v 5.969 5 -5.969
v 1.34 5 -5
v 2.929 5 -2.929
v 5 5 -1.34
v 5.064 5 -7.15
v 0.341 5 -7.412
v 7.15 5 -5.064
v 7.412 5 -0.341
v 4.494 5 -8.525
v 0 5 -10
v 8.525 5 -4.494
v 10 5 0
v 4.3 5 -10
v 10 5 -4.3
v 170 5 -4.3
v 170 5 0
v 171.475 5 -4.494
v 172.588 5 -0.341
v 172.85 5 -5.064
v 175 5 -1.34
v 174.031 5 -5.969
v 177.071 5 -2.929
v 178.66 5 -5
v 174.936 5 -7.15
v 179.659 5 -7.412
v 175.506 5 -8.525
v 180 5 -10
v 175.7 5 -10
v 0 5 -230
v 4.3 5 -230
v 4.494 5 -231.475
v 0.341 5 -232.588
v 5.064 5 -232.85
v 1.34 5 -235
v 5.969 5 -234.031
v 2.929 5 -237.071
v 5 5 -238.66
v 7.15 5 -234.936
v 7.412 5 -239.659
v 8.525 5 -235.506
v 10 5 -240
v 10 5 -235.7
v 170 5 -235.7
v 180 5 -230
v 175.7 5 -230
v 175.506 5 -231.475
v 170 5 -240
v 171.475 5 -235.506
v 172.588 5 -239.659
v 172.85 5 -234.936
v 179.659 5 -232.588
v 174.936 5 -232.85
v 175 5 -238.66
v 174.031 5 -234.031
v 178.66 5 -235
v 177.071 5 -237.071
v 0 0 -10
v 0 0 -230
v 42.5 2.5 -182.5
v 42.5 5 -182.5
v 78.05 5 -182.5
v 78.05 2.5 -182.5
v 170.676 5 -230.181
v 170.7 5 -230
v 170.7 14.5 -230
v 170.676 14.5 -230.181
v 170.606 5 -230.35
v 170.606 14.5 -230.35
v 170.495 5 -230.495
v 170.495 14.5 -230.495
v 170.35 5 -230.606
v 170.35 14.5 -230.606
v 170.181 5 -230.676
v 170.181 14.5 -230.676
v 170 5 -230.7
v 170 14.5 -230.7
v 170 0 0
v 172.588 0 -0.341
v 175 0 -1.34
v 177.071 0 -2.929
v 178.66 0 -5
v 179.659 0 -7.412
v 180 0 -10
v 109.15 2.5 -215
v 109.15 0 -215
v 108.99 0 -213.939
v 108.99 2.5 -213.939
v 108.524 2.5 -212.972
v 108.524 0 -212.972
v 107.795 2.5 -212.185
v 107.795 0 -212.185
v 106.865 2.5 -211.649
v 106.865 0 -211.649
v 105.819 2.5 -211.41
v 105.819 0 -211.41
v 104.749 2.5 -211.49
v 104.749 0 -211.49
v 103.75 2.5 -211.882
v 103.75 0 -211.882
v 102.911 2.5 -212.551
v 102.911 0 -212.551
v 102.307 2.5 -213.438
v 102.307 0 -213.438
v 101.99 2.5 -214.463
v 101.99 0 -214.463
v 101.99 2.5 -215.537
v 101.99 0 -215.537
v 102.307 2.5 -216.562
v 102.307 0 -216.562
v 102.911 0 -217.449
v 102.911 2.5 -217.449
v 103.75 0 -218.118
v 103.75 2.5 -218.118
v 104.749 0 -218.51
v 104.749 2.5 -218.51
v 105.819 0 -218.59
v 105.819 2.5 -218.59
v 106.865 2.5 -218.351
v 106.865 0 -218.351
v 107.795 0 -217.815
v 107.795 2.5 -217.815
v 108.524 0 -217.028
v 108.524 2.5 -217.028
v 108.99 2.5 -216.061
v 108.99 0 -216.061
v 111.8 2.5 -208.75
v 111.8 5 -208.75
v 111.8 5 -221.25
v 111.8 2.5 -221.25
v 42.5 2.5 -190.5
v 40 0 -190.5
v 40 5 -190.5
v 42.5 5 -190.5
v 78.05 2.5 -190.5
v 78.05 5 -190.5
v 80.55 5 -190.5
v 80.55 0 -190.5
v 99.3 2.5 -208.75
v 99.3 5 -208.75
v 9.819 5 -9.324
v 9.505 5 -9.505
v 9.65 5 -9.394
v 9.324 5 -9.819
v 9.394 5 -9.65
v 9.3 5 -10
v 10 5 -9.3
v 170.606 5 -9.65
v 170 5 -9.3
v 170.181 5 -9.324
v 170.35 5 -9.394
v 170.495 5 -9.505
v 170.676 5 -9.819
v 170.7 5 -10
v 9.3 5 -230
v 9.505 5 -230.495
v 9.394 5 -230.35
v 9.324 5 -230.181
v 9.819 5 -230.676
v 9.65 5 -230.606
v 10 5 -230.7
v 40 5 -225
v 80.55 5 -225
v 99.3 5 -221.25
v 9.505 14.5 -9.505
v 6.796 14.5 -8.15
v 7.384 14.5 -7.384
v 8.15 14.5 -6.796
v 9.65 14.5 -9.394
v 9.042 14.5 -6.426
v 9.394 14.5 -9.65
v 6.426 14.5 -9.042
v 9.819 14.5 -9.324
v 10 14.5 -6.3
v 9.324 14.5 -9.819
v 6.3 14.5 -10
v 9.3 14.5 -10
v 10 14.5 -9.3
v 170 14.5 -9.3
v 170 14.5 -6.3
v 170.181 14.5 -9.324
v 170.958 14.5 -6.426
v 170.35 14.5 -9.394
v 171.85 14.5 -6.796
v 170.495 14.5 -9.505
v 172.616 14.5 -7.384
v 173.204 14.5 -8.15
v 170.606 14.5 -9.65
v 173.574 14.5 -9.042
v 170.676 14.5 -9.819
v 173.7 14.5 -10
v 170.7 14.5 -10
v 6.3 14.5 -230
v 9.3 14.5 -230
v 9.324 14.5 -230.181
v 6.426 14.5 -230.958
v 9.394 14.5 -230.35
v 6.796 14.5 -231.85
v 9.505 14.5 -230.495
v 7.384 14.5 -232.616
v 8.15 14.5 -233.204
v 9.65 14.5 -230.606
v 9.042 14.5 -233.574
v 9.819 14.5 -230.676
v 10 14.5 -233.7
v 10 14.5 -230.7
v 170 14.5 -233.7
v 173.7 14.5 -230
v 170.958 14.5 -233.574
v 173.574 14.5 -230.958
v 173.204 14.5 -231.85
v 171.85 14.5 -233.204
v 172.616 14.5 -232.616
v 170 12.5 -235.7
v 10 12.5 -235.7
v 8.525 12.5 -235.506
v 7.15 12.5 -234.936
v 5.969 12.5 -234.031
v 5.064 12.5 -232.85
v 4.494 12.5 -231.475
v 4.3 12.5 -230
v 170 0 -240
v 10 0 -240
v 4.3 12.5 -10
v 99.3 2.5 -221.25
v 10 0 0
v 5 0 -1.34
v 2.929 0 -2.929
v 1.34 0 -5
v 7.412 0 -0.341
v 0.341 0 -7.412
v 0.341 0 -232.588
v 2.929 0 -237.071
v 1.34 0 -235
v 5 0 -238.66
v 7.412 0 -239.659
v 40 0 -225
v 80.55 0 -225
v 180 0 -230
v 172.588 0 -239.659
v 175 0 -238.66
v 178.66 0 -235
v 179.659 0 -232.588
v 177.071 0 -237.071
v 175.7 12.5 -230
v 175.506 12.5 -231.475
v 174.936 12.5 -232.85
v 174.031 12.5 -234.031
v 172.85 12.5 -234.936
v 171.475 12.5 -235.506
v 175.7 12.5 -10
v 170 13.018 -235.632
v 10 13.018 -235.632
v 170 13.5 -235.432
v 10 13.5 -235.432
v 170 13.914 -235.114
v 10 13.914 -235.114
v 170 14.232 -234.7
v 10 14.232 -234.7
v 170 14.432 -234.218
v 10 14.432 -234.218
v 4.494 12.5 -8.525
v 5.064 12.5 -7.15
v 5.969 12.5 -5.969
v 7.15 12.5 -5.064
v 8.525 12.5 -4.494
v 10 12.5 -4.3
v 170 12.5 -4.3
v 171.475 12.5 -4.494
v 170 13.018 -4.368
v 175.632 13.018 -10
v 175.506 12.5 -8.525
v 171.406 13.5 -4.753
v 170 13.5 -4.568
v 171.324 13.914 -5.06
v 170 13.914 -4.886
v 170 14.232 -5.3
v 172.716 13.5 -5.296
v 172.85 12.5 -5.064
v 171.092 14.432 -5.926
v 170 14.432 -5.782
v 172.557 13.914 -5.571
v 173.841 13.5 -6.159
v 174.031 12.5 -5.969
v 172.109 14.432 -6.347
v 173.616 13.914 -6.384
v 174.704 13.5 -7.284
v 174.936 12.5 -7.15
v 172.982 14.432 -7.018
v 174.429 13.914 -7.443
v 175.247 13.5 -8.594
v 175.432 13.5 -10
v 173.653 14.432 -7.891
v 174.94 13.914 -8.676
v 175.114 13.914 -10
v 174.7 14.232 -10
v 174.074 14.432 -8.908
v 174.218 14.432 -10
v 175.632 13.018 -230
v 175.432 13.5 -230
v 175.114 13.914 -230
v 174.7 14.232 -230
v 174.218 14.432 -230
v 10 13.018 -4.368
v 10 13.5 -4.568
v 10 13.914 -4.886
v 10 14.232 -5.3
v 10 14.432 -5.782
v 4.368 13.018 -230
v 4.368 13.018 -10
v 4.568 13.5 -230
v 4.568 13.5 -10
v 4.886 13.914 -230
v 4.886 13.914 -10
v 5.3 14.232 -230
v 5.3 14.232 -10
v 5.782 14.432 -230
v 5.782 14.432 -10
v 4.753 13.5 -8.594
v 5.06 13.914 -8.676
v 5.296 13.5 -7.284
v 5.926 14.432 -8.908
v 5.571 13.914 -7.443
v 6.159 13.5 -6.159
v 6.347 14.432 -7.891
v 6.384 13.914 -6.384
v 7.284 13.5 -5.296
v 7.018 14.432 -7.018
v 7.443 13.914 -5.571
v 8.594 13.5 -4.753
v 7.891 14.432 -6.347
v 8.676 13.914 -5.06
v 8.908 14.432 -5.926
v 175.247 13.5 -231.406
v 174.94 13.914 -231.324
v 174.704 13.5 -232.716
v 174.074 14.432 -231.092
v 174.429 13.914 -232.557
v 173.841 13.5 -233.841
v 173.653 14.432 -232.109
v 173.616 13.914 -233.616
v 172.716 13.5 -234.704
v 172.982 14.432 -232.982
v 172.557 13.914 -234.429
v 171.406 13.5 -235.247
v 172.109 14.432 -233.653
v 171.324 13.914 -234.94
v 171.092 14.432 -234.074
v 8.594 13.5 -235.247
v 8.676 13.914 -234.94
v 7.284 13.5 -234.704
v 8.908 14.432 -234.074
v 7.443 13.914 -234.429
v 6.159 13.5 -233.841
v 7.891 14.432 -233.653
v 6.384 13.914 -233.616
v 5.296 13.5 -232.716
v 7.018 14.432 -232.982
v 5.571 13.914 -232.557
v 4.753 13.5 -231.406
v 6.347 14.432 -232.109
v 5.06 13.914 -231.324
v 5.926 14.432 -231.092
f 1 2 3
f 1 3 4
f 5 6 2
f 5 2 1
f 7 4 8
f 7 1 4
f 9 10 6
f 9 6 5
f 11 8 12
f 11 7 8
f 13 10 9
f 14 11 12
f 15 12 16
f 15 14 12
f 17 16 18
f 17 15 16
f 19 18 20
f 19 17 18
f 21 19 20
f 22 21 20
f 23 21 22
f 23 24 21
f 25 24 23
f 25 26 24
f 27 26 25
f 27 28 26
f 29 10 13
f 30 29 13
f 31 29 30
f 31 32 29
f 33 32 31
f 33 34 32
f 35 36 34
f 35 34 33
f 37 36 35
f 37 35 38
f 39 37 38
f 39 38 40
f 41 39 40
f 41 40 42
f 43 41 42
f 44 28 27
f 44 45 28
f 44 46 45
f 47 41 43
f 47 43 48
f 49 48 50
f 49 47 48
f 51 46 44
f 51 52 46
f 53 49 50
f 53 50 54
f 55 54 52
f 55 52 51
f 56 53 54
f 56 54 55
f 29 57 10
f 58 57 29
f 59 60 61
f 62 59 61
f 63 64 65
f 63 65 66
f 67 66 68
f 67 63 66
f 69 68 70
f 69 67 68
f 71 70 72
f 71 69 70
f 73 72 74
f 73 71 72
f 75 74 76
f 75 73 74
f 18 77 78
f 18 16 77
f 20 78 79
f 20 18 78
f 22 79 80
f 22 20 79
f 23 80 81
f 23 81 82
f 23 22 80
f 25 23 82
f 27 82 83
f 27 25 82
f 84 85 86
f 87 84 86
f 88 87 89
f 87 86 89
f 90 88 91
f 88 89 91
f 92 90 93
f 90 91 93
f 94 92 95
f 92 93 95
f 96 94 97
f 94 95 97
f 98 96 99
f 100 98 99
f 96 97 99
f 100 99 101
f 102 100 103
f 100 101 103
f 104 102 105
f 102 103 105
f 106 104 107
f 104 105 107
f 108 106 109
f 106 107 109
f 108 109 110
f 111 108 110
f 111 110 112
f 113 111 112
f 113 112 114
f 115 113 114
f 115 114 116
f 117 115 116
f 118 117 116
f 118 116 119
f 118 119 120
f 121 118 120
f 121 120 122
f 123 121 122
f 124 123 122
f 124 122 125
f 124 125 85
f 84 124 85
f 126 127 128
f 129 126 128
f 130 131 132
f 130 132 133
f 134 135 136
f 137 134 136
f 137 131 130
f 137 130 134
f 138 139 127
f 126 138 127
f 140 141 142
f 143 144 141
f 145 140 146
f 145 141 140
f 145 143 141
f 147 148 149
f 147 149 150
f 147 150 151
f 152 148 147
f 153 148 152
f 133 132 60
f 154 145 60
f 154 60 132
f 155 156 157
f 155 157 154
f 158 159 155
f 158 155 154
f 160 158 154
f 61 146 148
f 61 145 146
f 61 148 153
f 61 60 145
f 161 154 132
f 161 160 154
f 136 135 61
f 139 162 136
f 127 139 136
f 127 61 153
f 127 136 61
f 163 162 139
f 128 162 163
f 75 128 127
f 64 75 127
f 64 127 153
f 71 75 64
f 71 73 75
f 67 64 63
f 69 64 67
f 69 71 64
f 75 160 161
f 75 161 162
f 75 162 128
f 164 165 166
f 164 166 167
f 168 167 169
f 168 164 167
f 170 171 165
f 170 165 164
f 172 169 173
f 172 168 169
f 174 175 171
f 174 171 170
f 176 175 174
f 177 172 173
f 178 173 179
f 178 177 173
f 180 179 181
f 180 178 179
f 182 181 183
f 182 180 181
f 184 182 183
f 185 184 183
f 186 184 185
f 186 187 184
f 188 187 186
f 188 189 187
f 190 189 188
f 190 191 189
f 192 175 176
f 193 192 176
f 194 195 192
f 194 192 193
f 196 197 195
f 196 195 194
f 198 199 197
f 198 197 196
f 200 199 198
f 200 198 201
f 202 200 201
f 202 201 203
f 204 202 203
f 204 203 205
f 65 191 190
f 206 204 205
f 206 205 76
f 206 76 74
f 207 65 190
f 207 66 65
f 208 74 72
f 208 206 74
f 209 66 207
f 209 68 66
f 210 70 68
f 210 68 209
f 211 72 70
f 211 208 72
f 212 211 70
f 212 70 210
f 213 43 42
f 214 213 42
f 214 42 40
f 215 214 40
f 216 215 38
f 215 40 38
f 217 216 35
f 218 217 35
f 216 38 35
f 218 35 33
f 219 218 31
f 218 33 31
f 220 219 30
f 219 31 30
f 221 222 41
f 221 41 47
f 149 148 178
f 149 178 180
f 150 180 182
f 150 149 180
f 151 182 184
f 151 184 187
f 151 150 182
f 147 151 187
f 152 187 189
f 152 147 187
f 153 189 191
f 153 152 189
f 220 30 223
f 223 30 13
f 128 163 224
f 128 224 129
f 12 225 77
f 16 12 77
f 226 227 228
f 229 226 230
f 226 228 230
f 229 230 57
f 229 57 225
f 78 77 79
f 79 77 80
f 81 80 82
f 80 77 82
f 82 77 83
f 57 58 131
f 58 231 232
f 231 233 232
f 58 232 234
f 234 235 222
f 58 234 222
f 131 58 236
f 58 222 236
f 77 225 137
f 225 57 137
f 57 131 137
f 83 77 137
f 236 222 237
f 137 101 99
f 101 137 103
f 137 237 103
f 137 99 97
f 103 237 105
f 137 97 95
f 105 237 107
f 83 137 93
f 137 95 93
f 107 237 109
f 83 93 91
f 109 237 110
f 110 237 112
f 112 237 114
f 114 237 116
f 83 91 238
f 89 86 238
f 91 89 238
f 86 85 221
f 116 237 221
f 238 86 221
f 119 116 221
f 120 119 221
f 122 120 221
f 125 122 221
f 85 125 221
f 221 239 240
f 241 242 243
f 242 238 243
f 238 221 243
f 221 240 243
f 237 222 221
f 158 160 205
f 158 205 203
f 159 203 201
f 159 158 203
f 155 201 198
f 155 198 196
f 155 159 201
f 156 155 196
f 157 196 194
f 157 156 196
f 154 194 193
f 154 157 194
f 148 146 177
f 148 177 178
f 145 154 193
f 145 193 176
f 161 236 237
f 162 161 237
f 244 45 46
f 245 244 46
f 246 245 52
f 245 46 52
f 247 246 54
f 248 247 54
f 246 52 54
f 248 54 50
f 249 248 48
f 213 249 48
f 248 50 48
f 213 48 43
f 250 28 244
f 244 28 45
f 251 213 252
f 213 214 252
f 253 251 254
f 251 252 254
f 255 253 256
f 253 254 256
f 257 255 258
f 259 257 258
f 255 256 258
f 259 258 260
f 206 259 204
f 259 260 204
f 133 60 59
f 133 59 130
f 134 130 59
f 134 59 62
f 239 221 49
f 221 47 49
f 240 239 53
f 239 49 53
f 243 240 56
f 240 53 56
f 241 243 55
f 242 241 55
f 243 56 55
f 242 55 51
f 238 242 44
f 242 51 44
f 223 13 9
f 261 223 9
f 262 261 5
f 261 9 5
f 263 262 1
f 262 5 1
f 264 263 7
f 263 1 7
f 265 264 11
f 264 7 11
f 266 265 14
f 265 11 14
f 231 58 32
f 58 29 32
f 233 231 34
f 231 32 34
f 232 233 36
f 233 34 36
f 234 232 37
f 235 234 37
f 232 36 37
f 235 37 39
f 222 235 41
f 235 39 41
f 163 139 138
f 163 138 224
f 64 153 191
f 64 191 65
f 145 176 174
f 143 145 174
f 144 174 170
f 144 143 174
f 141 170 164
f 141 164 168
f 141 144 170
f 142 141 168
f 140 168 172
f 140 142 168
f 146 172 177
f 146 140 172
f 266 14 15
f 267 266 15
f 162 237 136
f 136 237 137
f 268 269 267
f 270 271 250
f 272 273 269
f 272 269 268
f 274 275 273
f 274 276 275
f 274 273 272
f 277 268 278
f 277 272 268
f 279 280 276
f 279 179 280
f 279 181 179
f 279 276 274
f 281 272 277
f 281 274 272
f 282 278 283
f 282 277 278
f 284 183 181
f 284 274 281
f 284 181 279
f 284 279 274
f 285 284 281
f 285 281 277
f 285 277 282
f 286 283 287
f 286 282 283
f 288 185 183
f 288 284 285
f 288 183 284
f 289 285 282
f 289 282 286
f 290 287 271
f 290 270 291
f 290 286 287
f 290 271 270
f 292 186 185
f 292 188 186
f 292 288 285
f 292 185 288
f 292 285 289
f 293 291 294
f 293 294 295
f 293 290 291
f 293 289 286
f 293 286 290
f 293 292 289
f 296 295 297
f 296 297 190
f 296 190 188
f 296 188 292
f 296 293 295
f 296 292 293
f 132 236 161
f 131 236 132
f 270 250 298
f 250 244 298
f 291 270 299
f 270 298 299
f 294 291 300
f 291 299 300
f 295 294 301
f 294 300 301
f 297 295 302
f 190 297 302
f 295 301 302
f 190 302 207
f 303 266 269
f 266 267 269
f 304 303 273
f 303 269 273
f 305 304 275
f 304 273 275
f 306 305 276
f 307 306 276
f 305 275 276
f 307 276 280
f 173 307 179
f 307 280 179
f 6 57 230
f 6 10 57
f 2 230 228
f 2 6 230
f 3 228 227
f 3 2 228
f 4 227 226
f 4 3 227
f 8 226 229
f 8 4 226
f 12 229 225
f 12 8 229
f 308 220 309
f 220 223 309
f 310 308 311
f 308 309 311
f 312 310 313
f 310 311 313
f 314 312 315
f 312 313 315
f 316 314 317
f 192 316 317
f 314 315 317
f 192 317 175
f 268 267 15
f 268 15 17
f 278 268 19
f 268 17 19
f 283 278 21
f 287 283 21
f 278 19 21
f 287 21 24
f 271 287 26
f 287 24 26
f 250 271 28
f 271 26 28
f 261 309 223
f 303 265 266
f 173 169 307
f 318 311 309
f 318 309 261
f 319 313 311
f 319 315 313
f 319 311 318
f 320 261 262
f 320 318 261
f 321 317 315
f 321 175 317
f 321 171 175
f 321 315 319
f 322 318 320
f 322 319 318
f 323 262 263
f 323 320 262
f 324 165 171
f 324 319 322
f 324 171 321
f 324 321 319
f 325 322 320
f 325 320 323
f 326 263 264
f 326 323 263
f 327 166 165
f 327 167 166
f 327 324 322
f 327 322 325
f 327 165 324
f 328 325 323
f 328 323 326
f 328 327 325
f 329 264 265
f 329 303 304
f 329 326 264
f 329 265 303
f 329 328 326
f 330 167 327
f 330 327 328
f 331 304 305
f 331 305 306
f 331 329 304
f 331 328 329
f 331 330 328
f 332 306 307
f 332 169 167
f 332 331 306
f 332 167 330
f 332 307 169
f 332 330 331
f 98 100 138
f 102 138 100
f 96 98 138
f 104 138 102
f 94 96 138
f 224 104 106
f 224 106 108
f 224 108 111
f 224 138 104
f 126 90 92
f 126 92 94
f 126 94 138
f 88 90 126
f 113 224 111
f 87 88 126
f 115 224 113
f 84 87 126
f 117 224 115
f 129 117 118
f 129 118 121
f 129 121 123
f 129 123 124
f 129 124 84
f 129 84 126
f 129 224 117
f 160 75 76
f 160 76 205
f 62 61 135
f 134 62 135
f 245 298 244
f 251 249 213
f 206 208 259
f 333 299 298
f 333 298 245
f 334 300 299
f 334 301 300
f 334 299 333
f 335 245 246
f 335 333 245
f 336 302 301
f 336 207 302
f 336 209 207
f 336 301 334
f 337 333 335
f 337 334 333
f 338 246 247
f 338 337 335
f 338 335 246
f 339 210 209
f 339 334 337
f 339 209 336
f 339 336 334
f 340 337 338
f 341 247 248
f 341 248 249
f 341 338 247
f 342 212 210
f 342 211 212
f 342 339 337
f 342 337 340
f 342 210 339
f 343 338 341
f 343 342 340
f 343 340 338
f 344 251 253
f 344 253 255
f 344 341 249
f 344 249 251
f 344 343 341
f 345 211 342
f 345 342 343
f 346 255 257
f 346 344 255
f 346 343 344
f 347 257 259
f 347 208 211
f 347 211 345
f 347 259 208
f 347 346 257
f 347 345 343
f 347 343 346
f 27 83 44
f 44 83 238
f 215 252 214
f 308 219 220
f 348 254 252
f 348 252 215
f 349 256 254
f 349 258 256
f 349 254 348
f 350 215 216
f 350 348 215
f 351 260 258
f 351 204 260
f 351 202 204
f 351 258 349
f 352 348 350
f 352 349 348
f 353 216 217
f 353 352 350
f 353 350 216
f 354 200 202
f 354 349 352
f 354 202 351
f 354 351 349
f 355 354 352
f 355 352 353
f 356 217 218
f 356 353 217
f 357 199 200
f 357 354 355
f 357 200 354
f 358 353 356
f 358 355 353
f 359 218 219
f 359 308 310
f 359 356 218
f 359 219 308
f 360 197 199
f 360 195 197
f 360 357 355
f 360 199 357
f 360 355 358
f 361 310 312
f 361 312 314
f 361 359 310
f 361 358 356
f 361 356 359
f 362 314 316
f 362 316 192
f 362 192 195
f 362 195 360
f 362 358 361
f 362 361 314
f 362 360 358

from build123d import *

# Parameters (mm, degrees)
SKETCH1_W           = 180
SKETCH1_H           = 240
BOSS_EXTRUDE1_DEPTH = 5
SKETCH2_R           = 3.6
SKETCH2_W           = 40.55
SKETCH2_H           = 34.5
CUT_EXTRUDE1_DEPTH  = 6
SKETCH3_W           = 12.5
SKETCH3_H           = 12.5
CUT_EXTRUDE2_DEPTH  = 2.5
SKETCH4_W           = 35.55
SKETCH4_H           = 8
CUT_EXTRUDE3_DEPTH  = 2.5
FILLET1_R           = 10
BOSS_EXTRUDE2_DEPTH = 9.5
FILLET2_R           = 2


with BuildPart() as part:
    # Sketch1 → Boss-Extrude1 (new body)
    with BuildSketch(Plane(origin=(0, 0, 0), x_dir=(1, 0, 0), z_dir=(0, 1, 0))):
        with Locations((90, 120)):
            Rectangle(SKETCH1_W, SKETCH1_H)
    extrude(amount=BOSS_EXTRUDE1_DEPTH)

    # Sketch2 → Cut-Extrude1 (cut, through all)
    with BuildSketch(Plane.XZ):
        with Locations((105.55, -215)):
            Circle(SKETCH2_R)
        with Locations((60.275, -207.75)):
            Rectangle(SKETCH2_W, SKETCH2_H)
    extrude(amount=-CUT_EXTRUDE1_DEPTH, mode=Mode.SUBTRACT)

    # Sketch3 → Cut-Extrude2 (cut)
    with BuildSketch(Plane(origin=(0, 5, 0), x_dir=(1, 0, 0), z_dir=(0, 1, 0))):
        with Locations((105.55, 215)):
            Rectangle(SKETCH3_W, SKETCH3_H)
    extrude(amount=-CUT_EXTRUDE2_DEPTH, mode=Mode.SUBTRACT)

    # Sketch4 → Cut-Extrude3 (cut)
    with BuildSketch(Plane(origin=(0, 5, 0), x_dir=(1, 0, 0), z_dir=(0, 1, 0))):
        with Locations((60.275, 186.5)):
            Rectangle(SKETCH4_W, SKETCH4_H)
    extrude(amount=-CUT_EXTRUDE3_DEPTH, mode=Mode.SUBTRACT)

    # Fillet1
    fillet1_edges = [part.edges().sort_by_distance(p)[0] for p in [
        (0, 2.5, -240),
        (180, 2.5, -240),
        (180, 2.5, 0),
        (0, 2.5, 0),
    ]]
    fillet(fillet1_edges, radius=FILLET1_R)

    # Sketch6 → Boss-Extrude2 (add)
    with BuildSketch(Plane(origin=(0, 5, 0), x_dir=(1, 0, 0), z_dir=(0, 1, 0))):
        with BuildLine():
            Line((175.7, 10), (175.7, 230))
            ThreePointArc((175.7, 230), (174.030508653, 234.030508653), (170, 235.7))
            Line((170, 235.7), (10, 235.7))
            ThreePointArc((10, 235.7), (5.969491347, 234.030508653), (4.3, 230))
            Line((4.3, 230), (4.3, 10))
            ThreePointArc((4.3, 10), (5.969491347, 5.969491347), (10, 4.3))
            Line((10, 4.3), (170, 4.3))
            ThreePointArc((170, 4.3), (174.030508653, 5.969491347), (175.7, 10))
        make_face()
        with BuildLine():
            Line((170.7, 10), (170.7, 230))
            ThreePointArc((170.7, 230), (170.494974747, 230.494974747), (170, 230.7))
            Line((170, 230.7), (10, 230.7))
            ThreePointArc((10, 230.7), (9.505025253, 230.494974747), (9.3, 230))
            Line((9.3, 230), (9.3, 10))
            ThreePointArc((9.3, 10), (9.505025253, 9.505025253), (10, 9.3))
            Line((10, 9.3), (170, 9.3))
            ThreePointArc((170, 9.3), (170.494974747, 9.505025253), (170.7, 10))
        make_face(mode=Mode.SUBTRACT)
    extrude(amount=BOSS_EXTRUDE2_DEPTH)

    # Fillet2
    fillet2_edges = [part.edges().sort_by_distance(p)[0] for p in [
        (174.030508653, 14.5, -5.969491347),
        (175.7, 14.5, -120),
        (174.030508653, 14.5, -234.030508653),
        (90, 14.5, -235.7),
        (5.969491347, 14.5, -234.030508653),
        (4.3, 14.5, -120),
        (5.969491347, 14.5, -5.969491347),
        (90, 14.5, -4.3),
    ]]
    fillet(fillet2_edges, radius=FILLET2_R)


solid = part.part
